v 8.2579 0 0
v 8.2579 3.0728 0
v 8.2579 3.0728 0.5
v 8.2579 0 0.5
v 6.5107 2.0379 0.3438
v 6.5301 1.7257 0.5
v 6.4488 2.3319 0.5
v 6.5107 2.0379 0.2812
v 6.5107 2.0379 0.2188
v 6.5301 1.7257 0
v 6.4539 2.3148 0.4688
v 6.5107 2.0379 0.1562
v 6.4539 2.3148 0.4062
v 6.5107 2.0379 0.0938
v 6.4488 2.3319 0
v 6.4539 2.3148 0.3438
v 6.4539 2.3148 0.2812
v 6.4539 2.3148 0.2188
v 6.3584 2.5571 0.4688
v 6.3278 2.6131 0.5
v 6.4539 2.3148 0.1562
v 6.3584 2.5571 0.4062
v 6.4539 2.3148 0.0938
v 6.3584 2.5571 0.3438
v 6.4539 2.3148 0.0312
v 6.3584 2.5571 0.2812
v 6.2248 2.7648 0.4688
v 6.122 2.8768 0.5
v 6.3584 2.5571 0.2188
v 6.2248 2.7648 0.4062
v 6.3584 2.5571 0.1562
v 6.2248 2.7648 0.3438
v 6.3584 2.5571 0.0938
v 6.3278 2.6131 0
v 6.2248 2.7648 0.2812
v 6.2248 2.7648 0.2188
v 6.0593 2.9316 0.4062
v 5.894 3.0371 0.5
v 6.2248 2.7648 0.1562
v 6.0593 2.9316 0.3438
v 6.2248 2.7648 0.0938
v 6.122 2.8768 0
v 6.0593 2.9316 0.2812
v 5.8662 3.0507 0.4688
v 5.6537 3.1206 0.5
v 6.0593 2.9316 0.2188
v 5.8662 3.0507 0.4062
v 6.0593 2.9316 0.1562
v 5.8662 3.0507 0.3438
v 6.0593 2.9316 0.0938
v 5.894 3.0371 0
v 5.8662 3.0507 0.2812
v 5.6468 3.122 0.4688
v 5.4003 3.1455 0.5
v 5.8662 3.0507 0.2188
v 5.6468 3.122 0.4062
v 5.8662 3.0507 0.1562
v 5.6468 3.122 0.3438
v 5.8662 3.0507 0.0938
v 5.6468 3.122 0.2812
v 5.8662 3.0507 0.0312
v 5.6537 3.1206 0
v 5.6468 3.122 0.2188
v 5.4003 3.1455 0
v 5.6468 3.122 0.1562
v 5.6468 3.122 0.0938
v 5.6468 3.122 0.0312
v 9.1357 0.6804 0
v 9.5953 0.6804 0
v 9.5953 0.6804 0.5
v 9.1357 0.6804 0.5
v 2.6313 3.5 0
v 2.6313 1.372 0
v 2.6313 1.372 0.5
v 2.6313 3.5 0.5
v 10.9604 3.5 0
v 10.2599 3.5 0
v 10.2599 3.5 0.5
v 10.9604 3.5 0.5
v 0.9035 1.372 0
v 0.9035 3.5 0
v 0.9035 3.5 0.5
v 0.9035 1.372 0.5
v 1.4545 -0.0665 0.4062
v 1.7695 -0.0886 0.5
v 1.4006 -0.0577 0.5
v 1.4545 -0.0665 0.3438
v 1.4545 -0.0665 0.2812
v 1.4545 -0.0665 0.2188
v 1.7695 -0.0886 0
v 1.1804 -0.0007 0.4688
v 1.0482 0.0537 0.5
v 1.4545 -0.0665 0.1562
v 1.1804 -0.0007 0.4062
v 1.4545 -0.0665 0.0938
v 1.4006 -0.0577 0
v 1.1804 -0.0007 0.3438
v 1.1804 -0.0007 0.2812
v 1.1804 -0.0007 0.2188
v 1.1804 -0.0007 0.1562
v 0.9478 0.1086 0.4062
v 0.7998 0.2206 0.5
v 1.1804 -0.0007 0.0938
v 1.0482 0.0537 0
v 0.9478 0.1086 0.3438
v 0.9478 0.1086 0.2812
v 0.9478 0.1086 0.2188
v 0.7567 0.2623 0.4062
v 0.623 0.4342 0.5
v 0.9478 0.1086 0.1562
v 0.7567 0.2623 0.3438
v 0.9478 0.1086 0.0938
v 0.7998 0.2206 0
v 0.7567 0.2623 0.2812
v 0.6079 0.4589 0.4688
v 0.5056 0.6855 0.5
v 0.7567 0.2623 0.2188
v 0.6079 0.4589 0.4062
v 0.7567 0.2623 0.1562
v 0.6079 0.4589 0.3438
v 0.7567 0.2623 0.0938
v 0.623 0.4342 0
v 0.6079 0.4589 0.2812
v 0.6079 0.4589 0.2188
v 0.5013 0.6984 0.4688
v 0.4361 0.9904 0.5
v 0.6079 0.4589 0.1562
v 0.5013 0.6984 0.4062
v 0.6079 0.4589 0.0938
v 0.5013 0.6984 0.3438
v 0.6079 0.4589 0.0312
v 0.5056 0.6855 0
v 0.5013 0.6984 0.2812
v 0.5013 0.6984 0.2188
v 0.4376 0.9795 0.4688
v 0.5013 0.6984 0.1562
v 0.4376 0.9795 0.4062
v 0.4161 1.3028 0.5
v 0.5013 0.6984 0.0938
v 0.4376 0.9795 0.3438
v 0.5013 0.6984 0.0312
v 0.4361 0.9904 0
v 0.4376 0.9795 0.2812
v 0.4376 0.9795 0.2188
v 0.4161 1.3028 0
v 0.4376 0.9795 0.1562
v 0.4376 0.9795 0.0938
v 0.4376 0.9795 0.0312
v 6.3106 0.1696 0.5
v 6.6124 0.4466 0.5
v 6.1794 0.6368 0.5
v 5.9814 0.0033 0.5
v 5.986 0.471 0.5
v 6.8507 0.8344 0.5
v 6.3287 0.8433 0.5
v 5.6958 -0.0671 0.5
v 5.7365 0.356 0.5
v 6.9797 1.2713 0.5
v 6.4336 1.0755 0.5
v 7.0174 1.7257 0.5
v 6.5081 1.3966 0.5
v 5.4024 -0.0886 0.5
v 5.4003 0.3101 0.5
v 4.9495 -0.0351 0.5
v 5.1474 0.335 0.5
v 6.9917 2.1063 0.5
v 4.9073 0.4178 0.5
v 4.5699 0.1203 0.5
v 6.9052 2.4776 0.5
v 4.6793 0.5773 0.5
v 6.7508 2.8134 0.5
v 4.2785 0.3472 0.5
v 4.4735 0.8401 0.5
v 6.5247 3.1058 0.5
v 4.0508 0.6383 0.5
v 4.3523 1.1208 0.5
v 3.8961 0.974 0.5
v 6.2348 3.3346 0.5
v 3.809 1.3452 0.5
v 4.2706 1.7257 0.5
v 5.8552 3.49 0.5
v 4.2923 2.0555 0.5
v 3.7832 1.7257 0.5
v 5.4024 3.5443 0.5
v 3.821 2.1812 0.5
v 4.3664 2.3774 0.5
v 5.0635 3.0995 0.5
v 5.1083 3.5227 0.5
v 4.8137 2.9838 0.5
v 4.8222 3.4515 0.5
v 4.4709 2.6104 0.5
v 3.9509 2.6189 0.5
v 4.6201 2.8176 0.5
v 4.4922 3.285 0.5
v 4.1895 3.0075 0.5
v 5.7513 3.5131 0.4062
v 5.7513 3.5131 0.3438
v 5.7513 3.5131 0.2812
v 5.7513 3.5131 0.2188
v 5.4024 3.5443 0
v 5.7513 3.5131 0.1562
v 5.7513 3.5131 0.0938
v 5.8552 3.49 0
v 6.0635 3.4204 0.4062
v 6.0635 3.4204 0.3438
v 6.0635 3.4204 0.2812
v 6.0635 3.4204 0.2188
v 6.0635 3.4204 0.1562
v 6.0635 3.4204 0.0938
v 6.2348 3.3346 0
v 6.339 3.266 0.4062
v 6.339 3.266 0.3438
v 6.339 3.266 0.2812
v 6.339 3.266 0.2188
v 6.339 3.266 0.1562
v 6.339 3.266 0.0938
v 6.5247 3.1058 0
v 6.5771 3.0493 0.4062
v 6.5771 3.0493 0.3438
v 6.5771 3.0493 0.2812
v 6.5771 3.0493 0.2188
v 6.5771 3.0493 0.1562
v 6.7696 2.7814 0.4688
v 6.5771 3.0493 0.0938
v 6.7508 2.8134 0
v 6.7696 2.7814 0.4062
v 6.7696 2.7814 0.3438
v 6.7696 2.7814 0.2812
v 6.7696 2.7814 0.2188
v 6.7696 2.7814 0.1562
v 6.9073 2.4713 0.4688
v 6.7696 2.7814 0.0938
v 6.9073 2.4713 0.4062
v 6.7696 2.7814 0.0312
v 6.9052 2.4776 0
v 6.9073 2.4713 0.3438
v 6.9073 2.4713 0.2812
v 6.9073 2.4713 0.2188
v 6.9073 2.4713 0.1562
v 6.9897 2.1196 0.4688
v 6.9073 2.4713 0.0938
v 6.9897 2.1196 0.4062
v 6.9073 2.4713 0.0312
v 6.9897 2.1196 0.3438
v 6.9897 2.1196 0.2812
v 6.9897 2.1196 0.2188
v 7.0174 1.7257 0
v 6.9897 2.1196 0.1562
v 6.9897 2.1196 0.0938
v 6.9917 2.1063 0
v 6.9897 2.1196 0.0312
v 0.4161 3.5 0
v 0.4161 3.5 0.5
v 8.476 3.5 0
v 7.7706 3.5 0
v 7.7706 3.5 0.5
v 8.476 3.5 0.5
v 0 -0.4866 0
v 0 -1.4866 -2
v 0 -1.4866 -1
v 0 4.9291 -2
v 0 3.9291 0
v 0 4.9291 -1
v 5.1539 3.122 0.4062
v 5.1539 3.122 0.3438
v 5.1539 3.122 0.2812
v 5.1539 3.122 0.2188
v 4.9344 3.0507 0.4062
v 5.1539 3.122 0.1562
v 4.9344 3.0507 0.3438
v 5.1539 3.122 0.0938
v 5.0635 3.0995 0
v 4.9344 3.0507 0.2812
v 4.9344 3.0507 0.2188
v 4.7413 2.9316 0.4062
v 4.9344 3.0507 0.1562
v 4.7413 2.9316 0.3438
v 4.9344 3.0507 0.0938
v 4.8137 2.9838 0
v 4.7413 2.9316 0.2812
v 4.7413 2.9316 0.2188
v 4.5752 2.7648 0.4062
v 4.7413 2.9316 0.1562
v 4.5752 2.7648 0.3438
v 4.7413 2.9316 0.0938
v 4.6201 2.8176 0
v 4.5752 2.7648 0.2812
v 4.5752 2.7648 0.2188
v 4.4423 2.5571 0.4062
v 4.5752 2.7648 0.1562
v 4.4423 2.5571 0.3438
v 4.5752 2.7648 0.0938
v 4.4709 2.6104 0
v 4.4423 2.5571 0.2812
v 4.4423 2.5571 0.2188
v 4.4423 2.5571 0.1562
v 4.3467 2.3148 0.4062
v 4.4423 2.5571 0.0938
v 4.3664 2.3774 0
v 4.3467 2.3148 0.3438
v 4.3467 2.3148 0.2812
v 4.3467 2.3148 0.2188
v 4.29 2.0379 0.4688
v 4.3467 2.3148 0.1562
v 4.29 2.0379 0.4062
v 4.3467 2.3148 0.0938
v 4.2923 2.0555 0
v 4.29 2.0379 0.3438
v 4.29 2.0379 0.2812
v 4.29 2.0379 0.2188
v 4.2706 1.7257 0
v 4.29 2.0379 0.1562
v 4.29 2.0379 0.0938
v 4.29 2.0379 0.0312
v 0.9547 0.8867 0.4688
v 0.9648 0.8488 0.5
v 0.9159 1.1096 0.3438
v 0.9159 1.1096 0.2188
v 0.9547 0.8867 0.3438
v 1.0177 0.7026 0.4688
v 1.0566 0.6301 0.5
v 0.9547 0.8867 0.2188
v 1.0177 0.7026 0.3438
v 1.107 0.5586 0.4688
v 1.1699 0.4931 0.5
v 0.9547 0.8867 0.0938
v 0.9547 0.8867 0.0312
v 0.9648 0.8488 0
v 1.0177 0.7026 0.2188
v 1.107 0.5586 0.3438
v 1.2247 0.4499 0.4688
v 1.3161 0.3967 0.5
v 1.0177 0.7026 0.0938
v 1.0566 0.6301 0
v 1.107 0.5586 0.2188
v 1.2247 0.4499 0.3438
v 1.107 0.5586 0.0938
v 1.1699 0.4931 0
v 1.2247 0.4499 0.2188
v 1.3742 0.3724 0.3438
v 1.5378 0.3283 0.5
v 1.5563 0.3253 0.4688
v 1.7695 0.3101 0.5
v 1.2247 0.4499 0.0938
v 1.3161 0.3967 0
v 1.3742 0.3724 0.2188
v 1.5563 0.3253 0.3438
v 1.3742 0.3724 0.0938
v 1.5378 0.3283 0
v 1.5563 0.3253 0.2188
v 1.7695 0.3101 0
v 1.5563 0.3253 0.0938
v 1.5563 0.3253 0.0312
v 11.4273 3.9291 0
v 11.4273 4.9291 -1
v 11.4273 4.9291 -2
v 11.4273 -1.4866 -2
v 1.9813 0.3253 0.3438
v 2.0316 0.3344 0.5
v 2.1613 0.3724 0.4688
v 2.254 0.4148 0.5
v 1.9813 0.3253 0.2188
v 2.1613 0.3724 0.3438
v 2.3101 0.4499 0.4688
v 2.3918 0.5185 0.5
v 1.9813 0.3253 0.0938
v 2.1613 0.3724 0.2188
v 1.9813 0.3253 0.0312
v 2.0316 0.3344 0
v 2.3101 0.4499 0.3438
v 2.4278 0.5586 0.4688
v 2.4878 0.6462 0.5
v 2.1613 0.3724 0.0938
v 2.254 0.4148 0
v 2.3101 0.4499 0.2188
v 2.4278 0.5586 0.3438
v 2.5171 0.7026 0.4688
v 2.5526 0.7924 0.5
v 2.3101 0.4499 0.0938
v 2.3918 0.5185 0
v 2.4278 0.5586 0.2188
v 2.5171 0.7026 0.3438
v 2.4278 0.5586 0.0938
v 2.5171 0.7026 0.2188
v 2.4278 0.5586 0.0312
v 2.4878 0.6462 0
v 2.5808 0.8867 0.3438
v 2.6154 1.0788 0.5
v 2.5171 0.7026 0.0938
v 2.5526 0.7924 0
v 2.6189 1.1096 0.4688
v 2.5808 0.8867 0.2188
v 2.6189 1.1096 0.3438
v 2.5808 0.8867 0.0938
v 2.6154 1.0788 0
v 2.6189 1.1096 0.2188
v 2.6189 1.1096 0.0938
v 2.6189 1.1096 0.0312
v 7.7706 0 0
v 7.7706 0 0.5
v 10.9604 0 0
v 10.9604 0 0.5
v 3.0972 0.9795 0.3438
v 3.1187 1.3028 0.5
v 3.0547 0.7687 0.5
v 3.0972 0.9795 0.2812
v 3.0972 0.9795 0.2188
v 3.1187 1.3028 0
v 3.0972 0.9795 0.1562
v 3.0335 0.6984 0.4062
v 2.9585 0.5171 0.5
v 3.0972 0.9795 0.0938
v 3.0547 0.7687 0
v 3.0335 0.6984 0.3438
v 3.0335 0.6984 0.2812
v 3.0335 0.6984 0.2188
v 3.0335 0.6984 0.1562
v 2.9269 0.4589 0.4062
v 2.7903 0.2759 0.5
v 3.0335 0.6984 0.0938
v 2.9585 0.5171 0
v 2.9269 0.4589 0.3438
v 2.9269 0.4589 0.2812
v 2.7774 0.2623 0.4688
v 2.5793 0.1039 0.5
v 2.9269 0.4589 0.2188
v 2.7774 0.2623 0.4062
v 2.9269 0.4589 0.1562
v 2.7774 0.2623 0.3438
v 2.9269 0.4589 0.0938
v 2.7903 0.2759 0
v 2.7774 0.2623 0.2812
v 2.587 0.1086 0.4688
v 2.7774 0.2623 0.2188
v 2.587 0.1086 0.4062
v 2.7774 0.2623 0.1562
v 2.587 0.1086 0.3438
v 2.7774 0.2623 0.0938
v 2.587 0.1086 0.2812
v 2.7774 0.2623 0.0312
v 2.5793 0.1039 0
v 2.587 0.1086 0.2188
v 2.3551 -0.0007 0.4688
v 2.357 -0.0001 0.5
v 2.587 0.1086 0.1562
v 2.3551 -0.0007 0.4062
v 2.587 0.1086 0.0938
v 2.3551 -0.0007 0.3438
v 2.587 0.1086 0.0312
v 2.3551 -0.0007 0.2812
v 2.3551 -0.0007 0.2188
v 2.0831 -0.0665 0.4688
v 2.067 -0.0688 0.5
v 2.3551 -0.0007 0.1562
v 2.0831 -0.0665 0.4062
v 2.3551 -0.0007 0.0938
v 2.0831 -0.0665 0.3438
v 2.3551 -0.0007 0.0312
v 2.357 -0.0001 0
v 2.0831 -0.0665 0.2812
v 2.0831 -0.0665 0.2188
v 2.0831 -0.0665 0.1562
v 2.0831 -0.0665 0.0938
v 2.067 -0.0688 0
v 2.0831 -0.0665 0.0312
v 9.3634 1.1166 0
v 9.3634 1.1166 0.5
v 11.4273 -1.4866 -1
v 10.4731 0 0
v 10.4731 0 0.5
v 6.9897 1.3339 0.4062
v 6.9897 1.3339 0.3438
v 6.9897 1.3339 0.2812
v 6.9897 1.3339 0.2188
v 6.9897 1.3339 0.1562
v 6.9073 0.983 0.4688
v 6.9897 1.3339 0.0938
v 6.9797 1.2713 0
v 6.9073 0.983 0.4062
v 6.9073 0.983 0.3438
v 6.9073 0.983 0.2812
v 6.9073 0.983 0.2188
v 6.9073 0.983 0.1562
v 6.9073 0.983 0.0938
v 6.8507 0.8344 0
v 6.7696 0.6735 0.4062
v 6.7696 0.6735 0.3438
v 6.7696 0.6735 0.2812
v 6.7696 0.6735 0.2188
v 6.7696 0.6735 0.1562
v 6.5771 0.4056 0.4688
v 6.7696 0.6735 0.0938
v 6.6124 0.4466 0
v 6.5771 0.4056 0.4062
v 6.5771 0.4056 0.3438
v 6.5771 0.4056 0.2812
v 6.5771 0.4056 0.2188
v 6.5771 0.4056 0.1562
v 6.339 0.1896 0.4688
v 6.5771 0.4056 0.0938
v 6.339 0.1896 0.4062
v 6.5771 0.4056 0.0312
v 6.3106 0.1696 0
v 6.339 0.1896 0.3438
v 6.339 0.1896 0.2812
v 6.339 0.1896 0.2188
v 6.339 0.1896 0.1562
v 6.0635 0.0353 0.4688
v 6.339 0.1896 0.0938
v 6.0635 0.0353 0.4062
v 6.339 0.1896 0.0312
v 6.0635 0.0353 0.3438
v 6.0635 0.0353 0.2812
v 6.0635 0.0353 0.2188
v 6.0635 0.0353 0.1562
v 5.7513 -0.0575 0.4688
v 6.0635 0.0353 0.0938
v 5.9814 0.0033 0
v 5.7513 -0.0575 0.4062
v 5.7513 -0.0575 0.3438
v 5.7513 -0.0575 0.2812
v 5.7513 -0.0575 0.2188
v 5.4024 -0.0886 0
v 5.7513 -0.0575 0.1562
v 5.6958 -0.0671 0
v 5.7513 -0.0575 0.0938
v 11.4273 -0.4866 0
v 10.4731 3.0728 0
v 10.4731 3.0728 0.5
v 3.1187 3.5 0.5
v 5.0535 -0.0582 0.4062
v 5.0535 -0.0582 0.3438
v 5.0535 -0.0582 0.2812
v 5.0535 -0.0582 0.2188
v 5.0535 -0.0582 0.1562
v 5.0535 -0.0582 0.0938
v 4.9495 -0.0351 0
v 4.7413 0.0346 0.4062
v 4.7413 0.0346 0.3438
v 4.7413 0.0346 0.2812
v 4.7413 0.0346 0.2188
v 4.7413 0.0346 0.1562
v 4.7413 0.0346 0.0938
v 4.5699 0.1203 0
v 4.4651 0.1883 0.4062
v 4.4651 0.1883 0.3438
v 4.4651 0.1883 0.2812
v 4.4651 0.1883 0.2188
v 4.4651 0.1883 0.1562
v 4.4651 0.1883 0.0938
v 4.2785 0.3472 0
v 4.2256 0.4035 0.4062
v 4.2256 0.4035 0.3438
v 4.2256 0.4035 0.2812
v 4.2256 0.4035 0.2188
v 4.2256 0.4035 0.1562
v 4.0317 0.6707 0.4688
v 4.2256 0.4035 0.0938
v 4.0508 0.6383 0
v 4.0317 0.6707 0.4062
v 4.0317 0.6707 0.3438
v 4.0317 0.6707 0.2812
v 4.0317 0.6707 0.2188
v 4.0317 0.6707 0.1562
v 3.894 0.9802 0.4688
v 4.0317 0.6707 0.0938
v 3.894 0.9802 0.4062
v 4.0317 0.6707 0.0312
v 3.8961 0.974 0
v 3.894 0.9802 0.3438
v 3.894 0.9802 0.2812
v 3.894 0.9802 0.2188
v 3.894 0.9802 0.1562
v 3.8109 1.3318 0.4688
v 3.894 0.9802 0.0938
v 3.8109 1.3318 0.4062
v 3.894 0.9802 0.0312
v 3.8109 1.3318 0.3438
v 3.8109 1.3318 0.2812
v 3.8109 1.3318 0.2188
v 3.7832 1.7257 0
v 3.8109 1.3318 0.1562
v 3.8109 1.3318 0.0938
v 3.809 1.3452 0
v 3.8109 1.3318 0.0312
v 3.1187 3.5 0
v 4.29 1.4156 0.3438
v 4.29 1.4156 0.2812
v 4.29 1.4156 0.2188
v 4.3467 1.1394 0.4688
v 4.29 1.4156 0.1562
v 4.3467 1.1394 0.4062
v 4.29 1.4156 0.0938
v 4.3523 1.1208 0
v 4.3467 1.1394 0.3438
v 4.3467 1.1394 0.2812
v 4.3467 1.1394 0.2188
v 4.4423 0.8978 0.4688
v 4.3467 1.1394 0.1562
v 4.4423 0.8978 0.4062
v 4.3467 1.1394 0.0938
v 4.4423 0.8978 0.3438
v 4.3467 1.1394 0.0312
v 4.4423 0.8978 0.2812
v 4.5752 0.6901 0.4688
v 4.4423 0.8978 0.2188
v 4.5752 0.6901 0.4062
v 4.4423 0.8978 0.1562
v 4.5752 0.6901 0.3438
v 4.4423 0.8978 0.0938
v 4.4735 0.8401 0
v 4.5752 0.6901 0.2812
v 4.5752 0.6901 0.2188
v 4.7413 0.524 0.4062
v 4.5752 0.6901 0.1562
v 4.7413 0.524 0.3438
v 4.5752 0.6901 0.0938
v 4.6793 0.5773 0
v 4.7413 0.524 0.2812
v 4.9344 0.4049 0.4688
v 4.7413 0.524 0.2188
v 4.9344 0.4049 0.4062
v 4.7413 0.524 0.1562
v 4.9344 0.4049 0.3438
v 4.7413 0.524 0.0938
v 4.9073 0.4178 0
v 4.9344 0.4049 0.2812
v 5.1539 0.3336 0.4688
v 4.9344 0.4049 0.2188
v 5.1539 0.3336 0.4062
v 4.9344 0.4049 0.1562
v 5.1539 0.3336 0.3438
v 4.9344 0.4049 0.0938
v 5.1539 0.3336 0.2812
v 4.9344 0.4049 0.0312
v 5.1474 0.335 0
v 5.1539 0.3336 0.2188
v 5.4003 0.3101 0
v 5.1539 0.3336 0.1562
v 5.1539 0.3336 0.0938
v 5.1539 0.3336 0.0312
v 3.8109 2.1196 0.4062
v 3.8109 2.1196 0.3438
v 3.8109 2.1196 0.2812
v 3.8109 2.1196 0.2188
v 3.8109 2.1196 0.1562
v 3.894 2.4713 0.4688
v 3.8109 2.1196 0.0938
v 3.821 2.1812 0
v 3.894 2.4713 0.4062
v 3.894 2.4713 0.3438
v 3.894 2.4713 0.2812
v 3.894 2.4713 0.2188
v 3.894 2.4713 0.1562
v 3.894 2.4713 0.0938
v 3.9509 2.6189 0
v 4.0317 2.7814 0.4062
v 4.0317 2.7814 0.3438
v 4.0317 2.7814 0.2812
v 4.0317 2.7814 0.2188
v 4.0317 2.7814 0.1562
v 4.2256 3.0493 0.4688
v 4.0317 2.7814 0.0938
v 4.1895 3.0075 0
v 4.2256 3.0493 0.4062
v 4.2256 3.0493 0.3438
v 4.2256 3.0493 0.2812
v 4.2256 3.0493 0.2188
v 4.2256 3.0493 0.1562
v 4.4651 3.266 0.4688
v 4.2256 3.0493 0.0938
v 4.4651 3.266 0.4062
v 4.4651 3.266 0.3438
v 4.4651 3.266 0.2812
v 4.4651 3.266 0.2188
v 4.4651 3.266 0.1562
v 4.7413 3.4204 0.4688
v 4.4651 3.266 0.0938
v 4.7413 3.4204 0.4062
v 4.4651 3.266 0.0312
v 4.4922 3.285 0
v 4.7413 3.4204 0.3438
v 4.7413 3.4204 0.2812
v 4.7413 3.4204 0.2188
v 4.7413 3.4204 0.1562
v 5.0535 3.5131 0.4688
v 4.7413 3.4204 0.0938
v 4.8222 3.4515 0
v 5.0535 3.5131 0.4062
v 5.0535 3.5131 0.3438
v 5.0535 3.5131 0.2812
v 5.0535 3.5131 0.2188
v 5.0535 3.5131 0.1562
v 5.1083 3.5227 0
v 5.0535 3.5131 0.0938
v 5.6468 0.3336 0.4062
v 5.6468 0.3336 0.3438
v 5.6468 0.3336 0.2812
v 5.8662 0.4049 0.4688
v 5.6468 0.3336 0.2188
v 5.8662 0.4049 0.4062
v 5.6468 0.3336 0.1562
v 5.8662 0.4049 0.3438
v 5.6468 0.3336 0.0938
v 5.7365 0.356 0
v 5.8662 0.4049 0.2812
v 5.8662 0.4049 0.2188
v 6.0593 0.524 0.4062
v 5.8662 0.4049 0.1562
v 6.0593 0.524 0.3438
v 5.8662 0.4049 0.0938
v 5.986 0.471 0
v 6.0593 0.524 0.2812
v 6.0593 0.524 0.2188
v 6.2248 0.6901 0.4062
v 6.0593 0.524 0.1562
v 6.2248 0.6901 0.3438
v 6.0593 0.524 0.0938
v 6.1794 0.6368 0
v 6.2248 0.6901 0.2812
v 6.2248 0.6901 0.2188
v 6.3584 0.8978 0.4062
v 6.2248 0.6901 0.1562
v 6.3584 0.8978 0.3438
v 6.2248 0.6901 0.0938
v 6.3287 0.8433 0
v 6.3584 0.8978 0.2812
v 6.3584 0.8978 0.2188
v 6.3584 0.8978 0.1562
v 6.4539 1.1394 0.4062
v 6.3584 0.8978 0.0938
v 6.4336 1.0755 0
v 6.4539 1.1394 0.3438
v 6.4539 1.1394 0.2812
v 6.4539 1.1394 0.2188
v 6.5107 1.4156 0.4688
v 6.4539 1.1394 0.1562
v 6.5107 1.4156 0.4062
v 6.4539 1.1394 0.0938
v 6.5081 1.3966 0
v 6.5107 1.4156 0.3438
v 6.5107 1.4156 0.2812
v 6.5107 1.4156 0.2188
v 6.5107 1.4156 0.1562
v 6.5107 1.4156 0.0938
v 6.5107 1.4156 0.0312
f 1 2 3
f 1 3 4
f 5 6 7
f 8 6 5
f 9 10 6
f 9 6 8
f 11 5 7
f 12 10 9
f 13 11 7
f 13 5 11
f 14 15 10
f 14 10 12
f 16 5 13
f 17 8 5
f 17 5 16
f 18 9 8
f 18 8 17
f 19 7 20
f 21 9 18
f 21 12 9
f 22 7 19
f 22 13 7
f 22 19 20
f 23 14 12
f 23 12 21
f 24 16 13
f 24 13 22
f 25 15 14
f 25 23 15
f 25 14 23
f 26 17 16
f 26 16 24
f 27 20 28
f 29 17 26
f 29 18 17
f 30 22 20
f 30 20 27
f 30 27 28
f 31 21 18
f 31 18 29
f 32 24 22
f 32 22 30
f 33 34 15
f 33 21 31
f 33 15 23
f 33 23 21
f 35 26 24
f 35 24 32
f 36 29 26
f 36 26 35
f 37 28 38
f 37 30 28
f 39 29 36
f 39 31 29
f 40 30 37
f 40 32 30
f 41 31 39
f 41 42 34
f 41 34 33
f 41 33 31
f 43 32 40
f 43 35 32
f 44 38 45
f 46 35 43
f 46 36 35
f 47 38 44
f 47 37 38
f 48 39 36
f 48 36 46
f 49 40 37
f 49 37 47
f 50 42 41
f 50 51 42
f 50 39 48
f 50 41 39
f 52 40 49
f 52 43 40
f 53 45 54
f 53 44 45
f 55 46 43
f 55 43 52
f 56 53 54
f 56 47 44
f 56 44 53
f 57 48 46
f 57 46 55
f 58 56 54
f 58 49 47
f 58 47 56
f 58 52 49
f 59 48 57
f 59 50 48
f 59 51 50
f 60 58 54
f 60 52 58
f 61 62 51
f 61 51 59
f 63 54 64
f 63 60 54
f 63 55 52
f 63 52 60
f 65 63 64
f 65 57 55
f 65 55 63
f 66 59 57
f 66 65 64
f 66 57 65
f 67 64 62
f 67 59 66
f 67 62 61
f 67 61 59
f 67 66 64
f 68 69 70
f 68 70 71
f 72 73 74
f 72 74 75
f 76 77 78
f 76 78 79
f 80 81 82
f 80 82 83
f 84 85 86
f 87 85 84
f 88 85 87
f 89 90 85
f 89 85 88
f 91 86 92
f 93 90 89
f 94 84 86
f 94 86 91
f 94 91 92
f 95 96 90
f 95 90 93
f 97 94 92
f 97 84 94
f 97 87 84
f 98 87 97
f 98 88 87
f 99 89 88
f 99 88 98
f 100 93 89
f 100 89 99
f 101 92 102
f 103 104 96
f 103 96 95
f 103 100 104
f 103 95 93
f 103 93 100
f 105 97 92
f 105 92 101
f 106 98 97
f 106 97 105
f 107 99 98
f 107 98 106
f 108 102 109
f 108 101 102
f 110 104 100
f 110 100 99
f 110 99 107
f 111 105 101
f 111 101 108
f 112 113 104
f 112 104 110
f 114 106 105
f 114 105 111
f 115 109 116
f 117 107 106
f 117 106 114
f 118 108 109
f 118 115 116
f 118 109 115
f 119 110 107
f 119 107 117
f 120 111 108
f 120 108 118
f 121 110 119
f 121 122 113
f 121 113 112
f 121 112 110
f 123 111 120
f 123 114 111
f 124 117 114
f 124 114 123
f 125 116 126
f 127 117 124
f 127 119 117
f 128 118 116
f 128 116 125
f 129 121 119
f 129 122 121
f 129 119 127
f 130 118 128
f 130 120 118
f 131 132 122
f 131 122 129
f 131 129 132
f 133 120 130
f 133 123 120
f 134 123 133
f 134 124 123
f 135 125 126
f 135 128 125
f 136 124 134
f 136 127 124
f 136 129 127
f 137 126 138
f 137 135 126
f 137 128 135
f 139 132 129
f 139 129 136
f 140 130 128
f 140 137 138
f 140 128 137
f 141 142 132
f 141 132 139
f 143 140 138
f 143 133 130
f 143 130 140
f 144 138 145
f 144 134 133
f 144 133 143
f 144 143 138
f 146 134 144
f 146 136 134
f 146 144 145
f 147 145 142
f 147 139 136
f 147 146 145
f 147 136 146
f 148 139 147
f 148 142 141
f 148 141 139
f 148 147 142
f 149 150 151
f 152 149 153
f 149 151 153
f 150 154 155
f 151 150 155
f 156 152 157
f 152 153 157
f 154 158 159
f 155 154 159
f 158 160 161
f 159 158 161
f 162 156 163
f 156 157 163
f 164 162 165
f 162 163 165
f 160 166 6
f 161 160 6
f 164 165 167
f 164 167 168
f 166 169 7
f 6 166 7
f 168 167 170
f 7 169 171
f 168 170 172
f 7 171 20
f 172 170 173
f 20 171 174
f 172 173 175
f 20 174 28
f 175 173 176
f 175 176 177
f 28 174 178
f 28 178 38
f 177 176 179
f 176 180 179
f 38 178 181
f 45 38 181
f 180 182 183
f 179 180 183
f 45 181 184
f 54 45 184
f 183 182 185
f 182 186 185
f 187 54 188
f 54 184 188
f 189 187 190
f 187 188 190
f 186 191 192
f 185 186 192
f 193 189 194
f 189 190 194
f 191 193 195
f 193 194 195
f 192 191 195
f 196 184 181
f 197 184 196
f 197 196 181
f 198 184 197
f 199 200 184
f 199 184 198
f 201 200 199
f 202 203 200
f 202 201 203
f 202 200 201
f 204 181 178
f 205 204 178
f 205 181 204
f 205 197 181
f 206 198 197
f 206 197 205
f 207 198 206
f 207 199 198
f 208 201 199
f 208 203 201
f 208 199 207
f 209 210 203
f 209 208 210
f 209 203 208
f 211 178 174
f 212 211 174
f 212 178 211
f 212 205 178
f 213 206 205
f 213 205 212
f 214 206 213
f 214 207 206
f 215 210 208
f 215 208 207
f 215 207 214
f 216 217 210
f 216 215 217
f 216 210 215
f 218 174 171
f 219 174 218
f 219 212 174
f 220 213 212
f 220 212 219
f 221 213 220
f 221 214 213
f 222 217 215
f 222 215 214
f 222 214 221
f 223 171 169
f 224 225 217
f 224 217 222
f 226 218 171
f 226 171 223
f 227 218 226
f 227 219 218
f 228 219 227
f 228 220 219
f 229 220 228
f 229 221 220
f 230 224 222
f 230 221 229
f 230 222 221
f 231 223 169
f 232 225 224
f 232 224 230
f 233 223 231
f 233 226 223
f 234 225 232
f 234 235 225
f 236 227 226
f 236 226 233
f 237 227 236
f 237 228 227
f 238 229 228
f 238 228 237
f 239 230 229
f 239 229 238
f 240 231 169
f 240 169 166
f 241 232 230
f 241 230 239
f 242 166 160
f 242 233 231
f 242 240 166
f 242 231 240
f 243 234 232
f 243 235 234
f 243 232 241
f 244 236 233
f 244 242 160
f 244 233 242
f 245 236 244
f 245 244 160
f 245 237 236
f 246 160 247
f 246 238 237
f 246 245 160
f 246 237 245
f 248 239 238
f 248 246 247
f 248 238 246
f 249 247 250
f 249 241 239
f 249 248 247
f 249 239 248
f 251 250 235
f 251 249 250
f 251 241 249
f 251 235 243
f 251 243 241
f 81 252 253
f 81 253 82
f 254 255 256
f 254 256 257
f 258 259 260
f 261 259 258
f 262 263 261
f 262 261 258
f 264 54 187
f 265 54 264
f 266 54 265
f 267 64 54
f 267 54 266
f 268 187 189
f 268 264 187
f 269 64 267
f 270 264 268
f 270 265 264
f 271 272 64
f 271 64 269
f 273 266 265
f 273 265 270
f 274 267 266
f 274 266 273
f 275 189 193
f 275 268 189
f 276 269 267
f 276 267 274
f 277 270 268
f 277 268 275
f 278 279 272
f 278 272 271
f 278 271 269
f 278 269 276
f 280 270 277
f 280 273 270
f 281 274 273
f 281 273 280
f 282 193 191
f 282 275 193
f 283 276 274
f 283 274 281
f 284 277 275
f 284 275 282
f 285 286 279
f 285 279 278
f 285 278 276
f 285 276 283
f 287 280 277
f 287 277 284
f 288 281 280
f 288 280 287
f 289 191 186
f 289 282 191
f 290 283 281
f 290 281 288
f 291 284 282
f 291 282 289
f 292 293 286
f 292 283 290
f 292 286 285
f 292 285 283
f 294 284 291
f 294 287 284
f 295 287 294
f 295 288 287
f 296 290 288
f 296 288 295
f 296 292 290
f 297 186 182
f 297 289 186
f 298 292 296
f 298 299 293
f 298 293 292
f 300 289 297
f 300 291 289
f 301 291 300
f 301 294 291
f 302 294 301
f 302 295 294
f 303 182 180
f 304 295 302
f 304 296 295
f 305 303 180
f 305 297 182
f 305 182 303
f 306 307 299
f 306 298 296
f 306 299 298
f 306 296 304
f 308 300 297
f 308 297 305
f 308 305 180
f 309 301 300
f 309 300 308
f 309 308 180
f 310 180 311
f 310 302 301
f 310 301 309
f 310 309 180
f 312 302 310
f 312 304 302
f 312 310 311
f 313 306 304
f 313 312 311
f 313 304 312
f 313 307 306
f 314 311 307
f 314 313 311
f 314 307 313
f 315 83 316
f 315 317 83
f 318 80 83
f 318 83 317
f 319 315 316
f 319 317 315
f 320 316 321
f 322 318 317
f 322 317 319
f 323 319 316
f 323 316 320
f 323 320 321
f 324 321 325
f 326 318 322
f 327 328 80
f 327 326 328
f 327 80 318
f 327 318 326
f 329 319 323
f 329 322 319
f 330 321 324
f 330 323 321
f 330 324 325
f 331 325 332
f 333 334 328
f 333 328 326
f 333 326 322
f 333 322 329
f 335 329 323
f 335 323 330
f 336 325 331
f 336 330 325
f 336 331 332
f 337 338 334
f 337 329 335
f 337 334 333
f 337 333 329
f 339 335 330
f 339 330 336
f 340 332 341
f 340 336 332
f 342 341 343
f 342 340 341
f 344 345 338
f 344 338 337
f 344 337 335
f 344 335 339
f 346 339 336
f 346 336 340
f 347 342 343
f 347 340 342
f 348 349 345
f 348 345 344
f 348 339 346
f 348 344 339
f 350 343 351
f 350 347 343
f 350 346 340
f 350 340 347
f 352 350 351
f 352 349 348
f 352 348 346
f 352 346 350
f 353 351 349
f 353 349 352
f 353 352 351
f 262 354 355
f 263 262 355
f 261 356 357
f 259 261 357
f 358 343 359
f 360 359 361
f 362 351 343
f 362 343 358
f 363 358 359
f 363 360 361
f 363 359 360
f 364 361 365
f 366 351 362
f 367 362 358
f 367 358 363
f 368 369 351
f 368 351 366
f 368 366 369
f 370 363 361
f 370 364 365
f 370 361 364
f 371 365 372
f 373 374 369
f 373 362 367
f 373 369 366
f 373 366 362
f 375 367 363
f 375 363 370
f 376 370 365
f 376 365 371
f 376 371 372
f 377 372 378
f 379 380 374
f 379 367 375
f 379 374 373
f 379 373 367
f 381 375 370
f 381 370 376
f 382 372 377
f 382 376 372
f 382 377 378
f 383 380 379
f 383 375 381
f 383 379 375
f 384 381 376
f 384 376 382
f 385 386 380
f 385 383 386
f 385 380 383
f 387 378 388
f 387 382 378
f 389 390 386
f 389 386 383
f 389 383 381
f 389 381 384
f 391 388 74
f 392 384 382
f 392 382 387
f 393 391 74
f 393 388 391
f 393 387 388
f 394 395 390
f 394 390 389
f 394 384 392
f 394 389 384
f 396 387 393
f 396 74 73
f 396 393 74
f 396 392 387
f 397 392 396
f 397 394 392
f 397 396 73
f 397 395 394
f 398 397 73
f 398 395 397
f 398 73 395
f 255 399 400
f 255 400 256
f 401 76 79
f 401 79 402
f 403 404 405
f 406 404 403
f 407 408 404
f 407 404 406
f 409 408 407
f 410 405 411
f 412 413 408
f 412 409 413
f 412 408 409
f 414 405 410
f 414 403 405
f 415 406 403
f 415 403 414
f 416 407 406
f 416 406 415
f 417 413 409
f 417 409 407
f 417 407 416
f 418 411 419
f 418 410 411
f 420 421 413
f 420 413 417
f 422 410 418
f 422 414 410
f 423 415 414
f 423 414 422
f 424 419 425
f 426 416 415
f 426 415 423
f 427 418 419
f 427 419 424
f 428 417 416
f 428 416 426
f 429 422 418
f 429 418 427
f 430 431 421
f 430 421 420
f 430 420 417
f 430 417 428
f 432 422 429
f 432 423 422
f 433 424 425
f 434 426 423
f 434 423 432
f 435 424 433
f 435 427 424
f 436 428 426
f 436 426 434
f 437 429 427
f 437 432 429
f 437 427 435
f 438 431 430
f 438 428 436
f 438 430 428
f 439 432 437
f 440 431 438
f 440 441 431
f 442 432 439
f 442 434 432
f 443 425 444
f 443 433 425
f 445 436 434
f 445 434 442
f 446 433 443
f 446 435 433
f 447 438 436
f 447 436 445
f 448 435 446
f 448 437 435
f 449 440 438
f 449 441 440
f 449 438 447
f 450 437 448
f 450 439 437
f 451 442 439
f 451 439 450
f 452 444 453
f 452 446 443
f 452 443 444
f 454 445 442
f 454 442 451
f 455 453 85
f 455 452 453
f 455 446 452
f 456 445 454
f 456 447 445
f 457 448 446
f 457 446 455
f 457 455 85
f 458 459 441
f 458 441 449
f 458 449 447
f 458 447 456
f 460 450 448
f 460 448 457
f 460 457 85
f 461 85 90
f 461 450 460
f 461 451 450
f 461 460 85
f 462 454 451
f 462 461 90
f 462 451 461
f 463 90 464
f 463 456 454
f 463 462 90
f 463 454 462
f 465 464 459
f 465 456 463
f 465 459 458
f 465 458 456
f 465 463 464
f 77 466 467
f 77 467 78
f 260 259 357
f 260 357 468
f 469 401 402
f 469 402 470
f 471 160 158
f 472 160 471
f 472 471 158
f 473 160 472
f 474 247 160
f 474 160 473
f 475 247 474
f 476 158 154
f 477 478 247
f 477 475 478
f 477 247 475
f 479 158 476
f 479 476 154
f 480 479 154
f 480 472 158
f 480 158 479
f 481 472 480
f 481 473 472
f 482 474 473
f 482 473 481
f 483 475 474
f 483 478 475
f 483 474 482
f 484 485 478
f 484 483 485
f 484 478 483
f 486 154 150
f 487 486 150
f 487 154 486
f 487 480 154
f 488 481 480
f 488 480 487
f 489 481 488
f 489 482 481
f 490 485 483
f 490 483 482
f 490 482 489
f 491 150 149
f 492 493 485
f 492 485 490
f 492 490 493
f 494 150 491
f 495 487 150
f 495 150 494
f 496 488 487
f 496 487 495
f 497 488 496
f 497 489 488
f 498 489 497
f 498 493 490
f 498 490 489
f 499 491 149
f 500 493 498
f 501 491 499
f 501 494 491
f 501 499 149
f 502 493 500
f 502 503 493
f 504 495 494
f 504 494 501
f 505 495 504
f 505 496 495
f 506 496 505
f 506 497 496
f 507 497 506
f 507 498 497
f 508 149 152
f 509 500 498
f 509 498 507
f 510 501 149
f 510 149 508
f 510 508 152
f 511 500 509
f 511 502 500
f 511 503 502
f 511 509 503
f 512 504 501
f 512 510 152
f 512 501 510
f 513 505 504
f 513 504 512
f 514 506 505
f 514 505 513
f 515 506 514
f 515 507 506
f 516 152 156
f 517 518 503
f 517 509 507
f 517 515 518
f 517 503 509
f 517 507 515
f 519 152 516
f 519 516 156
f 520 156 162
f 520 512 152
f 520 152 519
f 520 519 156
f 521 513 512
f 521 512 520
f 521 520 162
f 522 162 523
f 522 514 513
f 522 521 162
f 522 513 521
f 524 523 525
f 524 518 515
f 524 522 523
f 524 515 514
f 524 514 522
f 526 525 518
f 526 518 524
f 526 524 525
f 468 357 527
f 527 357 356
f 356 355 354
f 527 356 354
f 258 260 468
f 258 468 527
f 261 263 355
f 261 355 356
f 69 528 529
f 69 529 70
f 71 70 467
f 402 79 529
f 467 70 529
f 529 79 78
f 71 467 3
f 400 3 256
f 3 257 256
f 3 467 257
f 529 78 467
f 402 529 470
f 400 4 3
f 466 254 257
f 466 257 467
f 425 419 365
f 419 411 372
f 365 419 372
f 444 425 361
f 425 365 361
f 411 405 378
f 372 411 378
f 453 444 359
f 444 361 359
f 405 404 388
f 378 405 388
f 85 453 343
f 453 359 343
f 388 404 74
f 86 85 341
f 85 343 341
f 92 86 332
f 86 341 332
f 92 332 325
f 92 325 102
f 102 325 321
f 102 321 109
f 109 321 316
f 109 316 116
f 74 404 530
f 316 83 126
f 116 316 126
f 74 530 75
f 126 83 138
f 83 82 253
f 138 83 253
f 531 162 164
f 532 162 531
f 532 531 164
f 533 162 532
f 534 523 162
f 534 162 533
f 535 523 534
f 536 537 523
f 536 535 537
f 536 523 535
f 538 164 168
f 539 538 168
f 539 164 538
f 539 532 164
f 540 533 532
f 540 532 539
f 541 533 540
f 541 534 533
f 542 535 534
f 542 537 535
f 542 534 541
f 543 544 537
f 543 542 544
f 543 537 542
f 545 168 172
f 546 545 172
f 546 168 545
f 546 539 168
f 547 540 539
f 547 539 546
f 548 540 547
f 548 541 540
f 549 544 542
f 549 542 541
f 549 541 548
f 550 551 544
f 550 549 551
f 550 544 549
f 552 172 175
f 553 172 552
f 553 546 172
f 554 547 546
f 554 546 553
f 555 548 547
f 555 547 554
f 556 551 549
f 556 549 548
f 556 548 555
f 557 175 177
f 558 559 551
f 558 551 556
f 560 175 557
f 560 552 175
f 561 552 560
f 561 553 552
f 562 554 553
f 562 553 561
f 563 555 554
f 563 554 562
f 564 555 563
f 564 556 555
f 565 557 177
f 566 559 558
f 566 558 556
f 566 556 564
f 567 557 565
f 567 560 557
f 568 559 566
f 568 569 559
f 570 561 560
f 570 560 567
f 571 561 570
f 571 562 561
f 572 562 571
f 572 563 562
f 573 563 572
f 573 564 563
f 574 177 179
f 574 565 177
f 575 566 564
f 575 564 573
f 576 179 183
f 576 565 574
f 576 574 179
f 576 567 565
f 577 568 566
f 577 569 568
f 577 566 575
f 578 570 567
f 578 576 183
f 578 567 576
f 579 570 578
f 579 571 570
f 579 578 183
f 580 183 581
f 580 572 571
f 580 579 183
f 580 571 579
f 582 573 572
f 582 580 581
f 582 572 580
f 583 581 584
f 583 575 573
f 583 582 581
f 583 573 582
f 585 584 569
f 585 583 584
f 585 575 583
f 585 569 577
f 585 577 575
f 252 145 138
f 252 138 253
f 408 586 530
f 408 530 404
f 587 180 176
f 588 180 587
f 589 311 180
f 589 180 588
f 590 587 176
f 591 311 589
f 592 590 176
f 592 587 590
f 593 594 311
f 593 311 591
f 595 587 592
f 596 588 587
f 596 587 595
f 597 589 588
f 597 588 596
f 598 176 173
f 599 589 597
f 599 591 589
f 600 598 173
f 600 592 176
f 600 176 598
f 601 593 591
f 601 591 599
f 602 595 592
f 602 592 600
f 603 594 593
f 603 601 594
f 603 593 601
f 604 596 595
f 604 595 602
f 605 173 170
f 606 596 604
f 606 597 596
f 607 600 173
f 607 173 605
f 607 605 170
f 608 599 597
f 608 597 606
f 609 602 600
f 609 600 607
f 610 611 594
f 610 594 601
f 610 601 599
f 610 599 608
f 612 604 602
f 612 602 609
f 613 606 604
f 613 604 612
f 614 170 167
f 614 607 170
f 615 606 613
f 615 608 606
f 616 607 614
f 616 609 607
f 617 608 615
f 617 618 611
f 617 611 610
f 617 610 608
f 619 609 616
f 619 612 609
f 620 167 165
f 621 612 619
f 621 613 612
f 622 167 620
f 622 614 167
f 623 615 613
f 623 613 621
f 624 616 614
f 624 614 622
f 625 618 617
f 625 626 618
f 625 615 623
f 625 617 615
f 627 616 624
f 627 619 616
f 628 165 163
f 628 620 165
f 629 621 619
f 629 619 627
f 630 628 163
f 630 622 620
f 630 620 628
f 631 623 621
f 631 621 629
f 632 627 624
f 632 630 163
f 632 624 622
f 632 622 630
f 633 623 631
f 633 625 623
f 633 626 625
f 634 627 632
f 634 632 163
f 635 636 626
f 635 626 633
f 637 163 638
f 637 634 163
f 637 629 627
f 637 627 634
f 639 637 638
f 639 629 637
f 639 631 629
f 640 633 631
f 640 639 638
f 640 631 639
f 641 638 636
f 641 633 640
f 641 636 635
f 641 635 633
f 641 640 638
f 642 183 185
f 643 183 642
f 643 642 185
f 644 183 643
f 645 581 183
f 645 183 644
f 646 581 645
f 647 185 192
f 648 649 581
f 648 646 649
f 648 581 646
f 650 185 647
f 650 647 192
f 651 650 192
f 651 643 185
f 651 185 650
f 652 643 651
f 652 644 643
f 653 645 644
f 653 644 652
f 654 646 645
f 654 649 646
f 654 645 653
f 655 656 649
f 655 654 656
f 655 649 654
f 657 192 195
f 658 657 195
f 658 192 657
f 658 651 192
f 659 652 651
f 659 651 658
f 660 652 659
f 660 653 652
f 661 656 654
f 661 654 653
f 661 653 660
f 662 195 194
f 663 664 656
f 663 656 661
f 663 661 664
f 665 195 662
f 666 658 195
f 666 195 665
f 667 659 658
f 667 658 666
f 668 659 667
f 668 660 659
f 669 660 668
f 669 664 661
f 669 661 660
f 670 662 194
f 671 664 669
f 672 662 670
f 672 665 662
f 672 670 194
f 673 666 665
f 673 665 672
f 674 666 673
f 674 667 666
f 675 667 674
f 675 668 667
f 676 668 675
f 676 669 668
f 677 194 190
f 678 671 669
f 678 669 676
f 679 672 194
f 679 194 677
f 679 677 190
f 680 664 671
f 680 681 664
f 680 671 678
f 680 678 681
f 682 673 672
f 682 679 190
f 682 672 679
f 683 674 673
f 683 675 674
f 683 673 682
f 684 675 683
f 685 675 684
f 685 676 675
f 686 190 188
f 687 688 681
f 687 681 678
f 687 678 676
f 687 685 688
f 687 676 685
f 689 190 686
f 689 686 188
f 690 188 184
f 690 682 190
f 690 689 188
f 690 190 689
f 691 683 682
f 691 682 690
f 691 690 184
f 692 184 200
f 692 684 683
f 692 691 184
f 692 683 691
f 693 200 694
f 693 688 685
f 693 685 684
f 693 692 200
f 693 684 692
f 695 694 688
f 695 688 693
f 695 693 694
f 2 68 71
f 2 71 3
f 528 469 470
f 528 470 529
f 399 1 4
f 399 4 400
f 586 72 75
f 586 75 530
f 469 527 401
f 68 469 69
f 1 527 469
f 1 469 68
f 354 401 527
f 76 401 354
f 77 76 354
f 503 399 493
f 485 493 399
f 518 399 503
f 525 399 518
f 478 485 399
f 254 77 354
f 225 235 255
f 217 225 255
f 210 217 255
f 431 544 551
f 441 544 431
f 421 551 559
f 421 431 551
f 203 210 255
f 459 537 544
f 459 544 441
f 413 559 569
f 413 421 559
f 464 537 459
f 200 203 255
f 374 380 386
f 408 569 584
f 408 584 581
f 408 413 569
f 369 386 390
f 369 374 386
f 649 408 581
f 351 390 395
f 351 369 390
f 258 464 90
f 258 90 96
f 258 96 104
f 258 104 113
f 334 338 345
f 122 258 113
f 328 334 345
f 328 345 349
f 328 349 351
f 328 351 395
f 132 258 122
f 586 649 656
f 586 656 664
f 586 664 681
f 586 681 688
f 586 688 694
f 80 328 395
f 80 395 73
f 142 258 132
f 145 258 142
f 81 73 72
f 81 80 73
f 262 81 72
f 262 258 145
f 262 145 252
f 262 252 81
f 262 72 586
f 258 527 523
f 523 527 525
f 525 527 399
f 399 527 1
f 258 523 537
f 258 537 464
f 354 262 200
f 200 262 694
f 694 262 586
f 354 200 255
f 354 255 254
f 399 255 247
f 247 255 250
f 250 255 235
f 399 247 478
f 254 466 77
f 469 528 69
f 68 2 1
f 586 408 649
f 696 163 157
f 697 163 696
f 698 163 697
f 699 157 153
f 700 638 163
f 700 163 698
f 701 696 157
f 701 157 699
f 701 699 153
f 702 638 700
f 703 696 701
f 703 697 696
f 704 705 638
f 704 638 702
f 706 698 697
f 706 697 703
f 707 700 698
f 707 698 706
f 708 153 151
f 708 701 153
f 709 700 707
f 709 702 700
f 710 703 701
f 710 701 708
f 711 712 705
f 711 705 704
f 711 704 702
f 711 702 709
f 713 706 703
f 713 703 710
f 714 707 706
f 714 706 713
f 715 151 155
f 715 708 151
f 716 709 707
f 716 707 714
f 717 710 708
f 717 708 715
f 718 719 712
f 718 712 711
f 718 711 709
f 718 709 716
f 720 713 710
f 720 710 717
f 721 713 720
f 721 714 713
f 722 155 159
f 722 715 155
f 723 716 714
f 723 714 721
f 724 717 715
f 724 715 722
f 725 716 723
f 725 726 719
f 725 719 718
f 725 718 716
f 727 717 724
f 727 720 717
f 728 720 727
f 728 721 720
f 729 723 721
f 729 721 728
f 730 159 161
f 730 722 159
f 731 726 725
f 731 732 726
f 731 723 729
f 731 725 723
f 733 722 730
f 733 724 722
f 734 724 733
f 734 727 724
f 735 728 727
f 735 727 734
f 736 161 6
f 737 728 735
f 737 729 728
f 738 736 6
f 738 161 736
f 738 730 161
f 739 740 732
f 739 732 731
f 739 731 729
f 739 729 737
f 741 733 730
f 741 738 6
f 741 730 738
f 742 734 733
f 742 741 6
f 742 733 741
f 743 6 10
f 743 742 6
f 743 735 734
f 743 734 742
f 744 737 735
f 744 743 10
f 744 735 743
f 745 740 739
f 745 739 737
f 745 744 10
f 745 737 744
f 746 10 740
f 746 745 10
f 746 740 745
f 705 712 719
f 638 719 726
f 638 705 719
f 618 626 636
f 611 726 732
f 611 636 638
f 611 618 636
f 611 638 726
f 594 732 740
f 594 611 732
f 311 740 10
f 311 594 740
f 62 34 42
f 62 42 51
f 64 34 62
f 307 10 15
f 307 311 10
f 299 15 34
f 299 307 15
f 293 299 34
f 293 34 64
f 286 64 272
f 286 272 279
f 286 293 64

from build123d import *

# Parameters (mm, degrees)
BOSS_EXTRUDE5_DEPTH = 11.427281
BOSS_EXTRUDE6_DEPTH = 0.5


with BuildPart() as part:
    # Sketch6 → Boss-Extrude5 (new body)
    with BuildSketch(Plane(origin=(0, 0, 0), x_dir=(0, 0, -1), z_dir=(1, 0, 0))):
        Polygon((1, 4.929146991), (2, 4.929146991), (2, -1.486632629), (1, -1.486632629), (0, -0.486632629), (0, 3.929146991), align=None)
    extrude(amount=BOSS_EXTRUDE5_DEPTH)

    # Sketch3 → Boss-Extrude6 (add)
    # profile 1 of 3: a face of its own
    with BuildSketch(Plane.XY):
        with BuildLine():
            Line((0.416143204, 3.499962788), (0.903484976, 3.499962788))
            Line((0.903484976, 3.499962788), (0.903484976, 1.371996016))
            add(Edge.make_bspline(
                [(0.903484976, 1.371996016), (0.904227086, 1.326524703), (0.905656325, 1.238950888), (0.914351034, 1.112472094), (0.929908885, 0.995823754), (0.952901435, 0.88903938), (0.980924682, 0.791621238), (1.015086709, 0.703774074), (1.056939832, 0.626271366), (1.104984797, 0.558086727), (1.160610571, 0.498806201), (1.224233651, 0.448193549), (1.295415202, 0.404639357), (1.375404867, 0.37044697), (1.462695851, 0.342558961), (1.558111742, 0.323476327), (1.661242149, 0.312624163), (1.732539226, 0.310954566), (1.769485767, 0.310089371)],
                knots=[0, 0, 0, 0, 1.376819889, 2.651635969, 3.836347594, 4.936722514, 5.955940511, 6.903042086, 7.784610942, 8.616290434, 9.4219432, 10.237023, 11.070988377, 11.94071121, 12.864328567, 13.841290783, 14.88134492, 16, 16, 16, 16], degree=3))
            add(Edge.make_bspline(
                [(1.769485767, 0.310089371), (1.806202381, 0.310952028), (1.877040741, 0.312616375), (1.979473884, 0.323496618), (2.074016457, 0.342434724), (2.160317672, 0.37056602), (2.239557597, 0.404801908), (2.310591352, 0.448180089), (2.374204682, 0.498809996), (2.42983769, 0.558084657), (2.477862395, 0.62627603), (2.519795758, 0.703755997), (2.553648868, 0.791757514), (2.583057817, 0.888807287), (2.604576184, 0.995949131), (2.620568037, 1.112448839), (2.62913327, 1.238957439), (2.630581241, 1.326526942), (2.631333077, 1.371996016)],
                knots=[0, 0, 0, 0, 1.114454679, 2.150147657, 3.122692882, 4.035279244, 4.900768316, 5.736820227, 6.553939311, 7.361607774, 8.195368082, 9.079142573, 10.028613743, 11.052372373, 12.154054081, 13.341729787, 14.619735386, 16, 16, 16, 16], degree=3))
            Line((2.631333077, 1.371996016), (2.631333077, 3.499962788))
            Line((2.631333077, 3.499962788), (3.118674849, 3.499962788))
            Line((3.118674849, 3.499962788), (3.118674849, 1.302771333))
            add(Edge.make_bspline(
                [(3.118674849, 1.302771333), (3.117632966, 1.247119199), (3.115609542, 1.139038072), (3.099395772, 0.982162679), (3.073760625, 0.835658607), (3.03631439, 0.699523534), (2.987830531, 0.574188519), (2.929913308, 0.458712614), (2.859816087, 0.354574755), (2.77943465, 0.260926992), (2.688738665, 0.177698385), (2.587499929, 0.10602186), (2.475912337, 0.045485903), (2.353984334, -0.003248427), (2.222507035, -0.042549241), (2.080438371, -0.068601387), (1.92843276, -0.085798259), (1.82353189, -0.087676906), (1.769485767, -0.088644806)],
                knots=[0, 0, 0, 0, 1.203396059, 2.33709643, 3.407052704, 4.416843994, 5.385341086, 6.309356336, 7.204900642, 8.093184639, 8.972733791, 9.860358641, 10.769263838, 11.711760021, 12.695515199, 13.732034436, 14.831518306, 16, 16, 16, 16], degree=3))
            add(Edge.make_bspline(
                [(1.769485767, -0.088644806), (1.71521014, -0.087673568), (1.609851426, -0.085788222), (1.457142055, -0.068631325), (1.314216014, -0.042395163), (1.181883322, -0.003559879), (1.059492843, 0.045718996), (0.947387007, 0.105755521), (0.846109761, 0.177988639), (0.75466648, 0.26044674), (0.675027309, 0.354825839), (0.605047005, 0.458877246), (0.545964542, 0.573840725), (0.498766704, 0.699718527), (0.460974682, 0.835625191), (0.435446342, 0.982172396), (0.419201909, 1.139035406), (0.417182842, 1.247118293), (0.416143204, 1.302771333)],
                knots=[0, 0, 0, 0, 1.171292133, 2.273687844, 3.313177071, 4.30466322, 5.245410695, 6.15700884, 7.042986791, 7.924584801, 8.807982338, 9.70186505, 10.626436486, 11.59135102, 12.599268744, 13.66723982, 14.798836723, 16, 16, 16, 16], degree=3))
            Line((0.416143204, 1.302771333), (0.416143204, 3.499962788))
        make_face()
    # profile 2 of 3: a face of its own
    with BuildSketch(Plane.XY):
        with BuildLine():
            add(Edge.make_bspline(
                [(5.402397159, 3.544266586), (5.462246122, 3.542948612), (5.579200043, 3.540373092), (5.749821524, 3.516018599), (5.911346929, 3.477588836), (6.063839721, 3.423299268), (6.207501548, 3.35408974), (6.341090707, 3.26794254), (6.465977946, 3.167203043), (6.57950417, 3.050514604), (6.682793918, 2.922216447), (6.772480012, 2.781879471), (6.848877785, 2.63150278), (6.910413596, 2.47007031), (6.959107704, 2.298965057), (6.992313654, 2.116961877), (7.013739577, 1.924922192), (7.016166669, 1.793172801), (7.017409026, 1.725734149)],
                knots=[0, 0, 0, 0, 1.046974495, 2.045946433, 3.009842023, 3.948749427, 4.873574893, 5.794485429, 6.724850033, 7.675874877, 8.638390309, 9.602979465, 10.585554, 11.585350169, 12.622203588, 13.694728314, 14.819998983, 16, 16, 16, 16], degree=3))
            add(Edge.make_bspline(
                [(7.017409026, 1.725734149), (7.016183724, 1.658523681), (7.013794306, 1.527459035), (6.992167411, 1.336142779), (6.959242213, 1.154771949), (6.910243582, 0.9839908), (6.849074922, 0.822869328), (6.772280141, 0.672915871), (6.682784418, 0.532734916), (6.579732711, 0.404417634), (6.465733721, 0.288426434), (6.34111492, 0.187668849), (6.20751823, 0.101465273), (6.063677323, 0.032569648), (5.911610665, -0.023084389), (5.749686437, -0.060093933), (5.579221976, -0.084834545), (5.462253547, -0.087355008), (5.402397159, -0.088644806)],
                knots=[0, 0, 0, 0, 1.177584306, 2.296363576, 3.370365481, 4.404756482, 5.405929662, 6.386251896, 7.352169572, 8.316010668, 9.265464185, 10.197110173, 11.11928907, 12.045388291, 12.986953489, 13.951235703, 14.951583516, 16, 16, 16, 16], degree=3))
            add(Edge.make_bspline(
                [(5.402397159, -0.088644806), (5.342559768, -0.087243888), (5.22565973, -0.084507014), (5.054907212, -0.06132131), (4.893466487, -0.022581169), (4.740913242, 0.031549646), (4.597373281, 0.101113043), (4.463019213, 0.186195092), (4.337474868, 0.286312005), (4.223239698, 0.402297965), (4.119135691, 0.530036826), (4.028797089, 0.669763824), (3.953338421, 0.820478357), (3.890768592, 0.981010653), (3.842305583, 1.152335357), (3.808156093, 1.334197343), (3.786955336, 1.526557072), (3.784492477, 1.65829921), (3.783231811, 1.725734149)],
                knots=[0, 0, 0, 0, 1.046993163, 2.04543576, 3.009348536, 3.94827268, 4.873114636, 5.795280634, 6.726275263, 7.67728276, 8.639205072, 9.605998851, 10.583164017, 11.584437137, 12.617423858, 13.694687211, 14.819977944, 16, 16, 16, 16], degree=3))
            add(Edge.make_bspline(
                [(3.783231811, 1.725734149), (3.784499678, 1.793167465), (3.786976606, 1.924906431), (3.808052274, 2.117063164), (3.842532146, 2.298844092), (3.890587304, 2.4702857), (3.953548456, 2.63111657), (4.028558923, 2.782292585), (4.119360297, 2.922184769), (4.223197774, 3.050551981), (4.337458654, 3.167215801), (4.463016032, 3.267978548), (4.597174521, 3.353910321), (4.740938987, 3.42332509), (4.893451716, 3.477581678), (5.054971582, 3.516020604), (5.2255946, 3.540372555), (5.342548306, 3.54294843), (5.402397159, 3.544266586)],
                knots=[0, 0, 0, 0, 1.178933409, 2.303185988, 3.375492215, 4.41140754, 5.41175692, 6.391624662, 7.35752651, 8.321699006, 9.274695168, 10.207356909, 11.130834481, 12.05482321, 12.992881136, 13.95590464, 14.953972757, 16, 16, 16, 16], degree=3))
        make_face()
        with BuildLine():
            add(Edge.make_bspline(
                [(5.400320419, 3.145532409), (5.35803641, 3.14427069), (5.27541253, 3.141805264), (5.154622477, 3.124415503), (5.040796804, 3.094770228), (4.933403863, 3.052757792), (4.833088358, 2.998703881), (4.739097158, 2.932857447), (4.652403926, 2.854815258), (4.572869424, 2.765379259), (4.501719741, 2.665767382), (4.440079646, 2.55698884), (4.386908752, 2.439945508), (4.344436085, 2.313670722), (4.311169081, 2.178899707), (4.288130717, 2.035568821), (4.273106925, 1.883655163), (4.271432966, 1.779305484), (4.270573583, 1.725734149)],
                knots=[0, 0, 0, 0, 0.992078402, 1.938542973, 2.856561574, 3.746427499, 4.637939252, 5.524223217, 6.432997522, 7.368745408, 8.327383014, 9.299866671, 10.29827865, 11.339356729, 12.421474065, 13.551982278, 14.743229712, 16, 16, 16, 16], degree=3))
            add(Edge.make_bspline(
                [(4.270573583, 1.725734149), (4.271435175, 1.672623784), (4.273116806, 1.568964413), (4.288197128, 1.417753347), (4.311085619, 1.274857783), (4.344420664, 1.140549714), (4.387052766, 1.014803381), (4.440069416, 0.897940197), (4.501709798, 0.789146996), (4.57291796, 0.689609896), (4.652124511, 0.600014393), (4.739595317, 0.522951233), (4.832626534, 0.455951117), (4.933648368, 0.403070886), (5.040757185, 0.360783207), (5.154633534, 0.33122535), (5.275409573, 0.313811414), (5.358035409, 0.311349362), (5.400320419, 0.310089371)],
                knots=[0, 0, 0, 0, 1.248257537, 2.436315255, 3.568920878, 4.647780726, 5.68565685, 6.685921162, 7.660209049, 8.620625195, 9.558109156, 10.4649585, 11.356013141, 12.24662183, 13.138138705, 14.057860487, 15.006081015, 16, 16, 16, 16], degree=3))
            add(Edge.make_bspline(
                [(5.400320419, 0.310089371), (5.442604788, 0.311350447), (5.525229374, 0.313814618), (5.646014372, 0.331213368), (5.759858322, 0.36082614), (5.866893881, 0.402841381), (5.967484462, 0.456415555), (6.060976588, 0.522453192), (6.147787085, 0.600316817), (6.227118702, 0.689535237), (6.298104952, 0.789362494), (6.360719863, 0.897721104), (6.413532899, 1.014835582), (6.45623582, 1.140540581), (6.48955073, 1.274860403), (6.512444996, 1.417752597), (6.527523684, 1.568964615), (6.529205545, 1.672623853), (6.530067254, 1.725734149)],
                knots=[0, 0, 0, 0, 0.994024979, 1.942346626, 2.862166489, 3.753778437, 4.639694184, 5.535275203, 6.438171751, 7.375755687, 8.336274254, 9.313365839, 10.313736821, 11.351723626, 12.430698526, 13.563424932, 14.751609347, 16, 16, 16, 16], degree=3))
            add(Edge.make_bspline(
                [(6.530067254, 1.725734149), (6.529207753, 1.779305414), (6.527533561, 1.883654958), (6.512511413, 2.035569575), (6.489467259, 2.178897083), (6.456220518, 2.313679923), (6.41367661, 2.439913134), (6.360709572, 2.557207896), (6.298094939, 2.665551865), (6.22716738, 2.76545382), (6.147506692, 2.854513751), (6.061474862, 2.933355261), (5.967022545, 2.998239032), (5.867139571, 3.052987268), (5.759818468, 3.094727141), (5.646025495, 3.124427529), (5.525226399, 3.141802048), (5.442603781, 3.144269602), (5.400320419, 3.145532409)],
                knots=[0, 0, 0, 0, 1.256900501, 2.448271359, 3.578896704, 4.661126157, 5.702312102, 6.700827525, 7.676106732, 8.634843661, 9.5706885, 10.475531073, 11.366345495, 12.253184336, 13.14314246, 14.061256176, 15.007818809, 16, 16, 16, 16], degree=3))
        make_face(mode=Mode.SUBTRACT)
    # profile 3 of 3: a face of its own
    with BuildSketch(Plane.XY):
        Polygon((7.770573583, 3.499962788), (8.475973109, 3.499962788), (9.363433552, 1.116556934), (10.259893204, 3.499962788), (10.960447001, 3.499962788), (10.960447001, -3.7212e-05), (10.473105229, -3.7212e-05), (10.473105229, 3.072846491), (9.595336242, 0.680441428), (9.135684343, 0.680441428), (8.257915355, 3.072846491), (8.257915355, -3.7212e-05), (7.770573583, -3.7212e-05), align=None)
    extrude(amount=BOSS_EXTRUDE6_DEPTH)


solid = part.part
